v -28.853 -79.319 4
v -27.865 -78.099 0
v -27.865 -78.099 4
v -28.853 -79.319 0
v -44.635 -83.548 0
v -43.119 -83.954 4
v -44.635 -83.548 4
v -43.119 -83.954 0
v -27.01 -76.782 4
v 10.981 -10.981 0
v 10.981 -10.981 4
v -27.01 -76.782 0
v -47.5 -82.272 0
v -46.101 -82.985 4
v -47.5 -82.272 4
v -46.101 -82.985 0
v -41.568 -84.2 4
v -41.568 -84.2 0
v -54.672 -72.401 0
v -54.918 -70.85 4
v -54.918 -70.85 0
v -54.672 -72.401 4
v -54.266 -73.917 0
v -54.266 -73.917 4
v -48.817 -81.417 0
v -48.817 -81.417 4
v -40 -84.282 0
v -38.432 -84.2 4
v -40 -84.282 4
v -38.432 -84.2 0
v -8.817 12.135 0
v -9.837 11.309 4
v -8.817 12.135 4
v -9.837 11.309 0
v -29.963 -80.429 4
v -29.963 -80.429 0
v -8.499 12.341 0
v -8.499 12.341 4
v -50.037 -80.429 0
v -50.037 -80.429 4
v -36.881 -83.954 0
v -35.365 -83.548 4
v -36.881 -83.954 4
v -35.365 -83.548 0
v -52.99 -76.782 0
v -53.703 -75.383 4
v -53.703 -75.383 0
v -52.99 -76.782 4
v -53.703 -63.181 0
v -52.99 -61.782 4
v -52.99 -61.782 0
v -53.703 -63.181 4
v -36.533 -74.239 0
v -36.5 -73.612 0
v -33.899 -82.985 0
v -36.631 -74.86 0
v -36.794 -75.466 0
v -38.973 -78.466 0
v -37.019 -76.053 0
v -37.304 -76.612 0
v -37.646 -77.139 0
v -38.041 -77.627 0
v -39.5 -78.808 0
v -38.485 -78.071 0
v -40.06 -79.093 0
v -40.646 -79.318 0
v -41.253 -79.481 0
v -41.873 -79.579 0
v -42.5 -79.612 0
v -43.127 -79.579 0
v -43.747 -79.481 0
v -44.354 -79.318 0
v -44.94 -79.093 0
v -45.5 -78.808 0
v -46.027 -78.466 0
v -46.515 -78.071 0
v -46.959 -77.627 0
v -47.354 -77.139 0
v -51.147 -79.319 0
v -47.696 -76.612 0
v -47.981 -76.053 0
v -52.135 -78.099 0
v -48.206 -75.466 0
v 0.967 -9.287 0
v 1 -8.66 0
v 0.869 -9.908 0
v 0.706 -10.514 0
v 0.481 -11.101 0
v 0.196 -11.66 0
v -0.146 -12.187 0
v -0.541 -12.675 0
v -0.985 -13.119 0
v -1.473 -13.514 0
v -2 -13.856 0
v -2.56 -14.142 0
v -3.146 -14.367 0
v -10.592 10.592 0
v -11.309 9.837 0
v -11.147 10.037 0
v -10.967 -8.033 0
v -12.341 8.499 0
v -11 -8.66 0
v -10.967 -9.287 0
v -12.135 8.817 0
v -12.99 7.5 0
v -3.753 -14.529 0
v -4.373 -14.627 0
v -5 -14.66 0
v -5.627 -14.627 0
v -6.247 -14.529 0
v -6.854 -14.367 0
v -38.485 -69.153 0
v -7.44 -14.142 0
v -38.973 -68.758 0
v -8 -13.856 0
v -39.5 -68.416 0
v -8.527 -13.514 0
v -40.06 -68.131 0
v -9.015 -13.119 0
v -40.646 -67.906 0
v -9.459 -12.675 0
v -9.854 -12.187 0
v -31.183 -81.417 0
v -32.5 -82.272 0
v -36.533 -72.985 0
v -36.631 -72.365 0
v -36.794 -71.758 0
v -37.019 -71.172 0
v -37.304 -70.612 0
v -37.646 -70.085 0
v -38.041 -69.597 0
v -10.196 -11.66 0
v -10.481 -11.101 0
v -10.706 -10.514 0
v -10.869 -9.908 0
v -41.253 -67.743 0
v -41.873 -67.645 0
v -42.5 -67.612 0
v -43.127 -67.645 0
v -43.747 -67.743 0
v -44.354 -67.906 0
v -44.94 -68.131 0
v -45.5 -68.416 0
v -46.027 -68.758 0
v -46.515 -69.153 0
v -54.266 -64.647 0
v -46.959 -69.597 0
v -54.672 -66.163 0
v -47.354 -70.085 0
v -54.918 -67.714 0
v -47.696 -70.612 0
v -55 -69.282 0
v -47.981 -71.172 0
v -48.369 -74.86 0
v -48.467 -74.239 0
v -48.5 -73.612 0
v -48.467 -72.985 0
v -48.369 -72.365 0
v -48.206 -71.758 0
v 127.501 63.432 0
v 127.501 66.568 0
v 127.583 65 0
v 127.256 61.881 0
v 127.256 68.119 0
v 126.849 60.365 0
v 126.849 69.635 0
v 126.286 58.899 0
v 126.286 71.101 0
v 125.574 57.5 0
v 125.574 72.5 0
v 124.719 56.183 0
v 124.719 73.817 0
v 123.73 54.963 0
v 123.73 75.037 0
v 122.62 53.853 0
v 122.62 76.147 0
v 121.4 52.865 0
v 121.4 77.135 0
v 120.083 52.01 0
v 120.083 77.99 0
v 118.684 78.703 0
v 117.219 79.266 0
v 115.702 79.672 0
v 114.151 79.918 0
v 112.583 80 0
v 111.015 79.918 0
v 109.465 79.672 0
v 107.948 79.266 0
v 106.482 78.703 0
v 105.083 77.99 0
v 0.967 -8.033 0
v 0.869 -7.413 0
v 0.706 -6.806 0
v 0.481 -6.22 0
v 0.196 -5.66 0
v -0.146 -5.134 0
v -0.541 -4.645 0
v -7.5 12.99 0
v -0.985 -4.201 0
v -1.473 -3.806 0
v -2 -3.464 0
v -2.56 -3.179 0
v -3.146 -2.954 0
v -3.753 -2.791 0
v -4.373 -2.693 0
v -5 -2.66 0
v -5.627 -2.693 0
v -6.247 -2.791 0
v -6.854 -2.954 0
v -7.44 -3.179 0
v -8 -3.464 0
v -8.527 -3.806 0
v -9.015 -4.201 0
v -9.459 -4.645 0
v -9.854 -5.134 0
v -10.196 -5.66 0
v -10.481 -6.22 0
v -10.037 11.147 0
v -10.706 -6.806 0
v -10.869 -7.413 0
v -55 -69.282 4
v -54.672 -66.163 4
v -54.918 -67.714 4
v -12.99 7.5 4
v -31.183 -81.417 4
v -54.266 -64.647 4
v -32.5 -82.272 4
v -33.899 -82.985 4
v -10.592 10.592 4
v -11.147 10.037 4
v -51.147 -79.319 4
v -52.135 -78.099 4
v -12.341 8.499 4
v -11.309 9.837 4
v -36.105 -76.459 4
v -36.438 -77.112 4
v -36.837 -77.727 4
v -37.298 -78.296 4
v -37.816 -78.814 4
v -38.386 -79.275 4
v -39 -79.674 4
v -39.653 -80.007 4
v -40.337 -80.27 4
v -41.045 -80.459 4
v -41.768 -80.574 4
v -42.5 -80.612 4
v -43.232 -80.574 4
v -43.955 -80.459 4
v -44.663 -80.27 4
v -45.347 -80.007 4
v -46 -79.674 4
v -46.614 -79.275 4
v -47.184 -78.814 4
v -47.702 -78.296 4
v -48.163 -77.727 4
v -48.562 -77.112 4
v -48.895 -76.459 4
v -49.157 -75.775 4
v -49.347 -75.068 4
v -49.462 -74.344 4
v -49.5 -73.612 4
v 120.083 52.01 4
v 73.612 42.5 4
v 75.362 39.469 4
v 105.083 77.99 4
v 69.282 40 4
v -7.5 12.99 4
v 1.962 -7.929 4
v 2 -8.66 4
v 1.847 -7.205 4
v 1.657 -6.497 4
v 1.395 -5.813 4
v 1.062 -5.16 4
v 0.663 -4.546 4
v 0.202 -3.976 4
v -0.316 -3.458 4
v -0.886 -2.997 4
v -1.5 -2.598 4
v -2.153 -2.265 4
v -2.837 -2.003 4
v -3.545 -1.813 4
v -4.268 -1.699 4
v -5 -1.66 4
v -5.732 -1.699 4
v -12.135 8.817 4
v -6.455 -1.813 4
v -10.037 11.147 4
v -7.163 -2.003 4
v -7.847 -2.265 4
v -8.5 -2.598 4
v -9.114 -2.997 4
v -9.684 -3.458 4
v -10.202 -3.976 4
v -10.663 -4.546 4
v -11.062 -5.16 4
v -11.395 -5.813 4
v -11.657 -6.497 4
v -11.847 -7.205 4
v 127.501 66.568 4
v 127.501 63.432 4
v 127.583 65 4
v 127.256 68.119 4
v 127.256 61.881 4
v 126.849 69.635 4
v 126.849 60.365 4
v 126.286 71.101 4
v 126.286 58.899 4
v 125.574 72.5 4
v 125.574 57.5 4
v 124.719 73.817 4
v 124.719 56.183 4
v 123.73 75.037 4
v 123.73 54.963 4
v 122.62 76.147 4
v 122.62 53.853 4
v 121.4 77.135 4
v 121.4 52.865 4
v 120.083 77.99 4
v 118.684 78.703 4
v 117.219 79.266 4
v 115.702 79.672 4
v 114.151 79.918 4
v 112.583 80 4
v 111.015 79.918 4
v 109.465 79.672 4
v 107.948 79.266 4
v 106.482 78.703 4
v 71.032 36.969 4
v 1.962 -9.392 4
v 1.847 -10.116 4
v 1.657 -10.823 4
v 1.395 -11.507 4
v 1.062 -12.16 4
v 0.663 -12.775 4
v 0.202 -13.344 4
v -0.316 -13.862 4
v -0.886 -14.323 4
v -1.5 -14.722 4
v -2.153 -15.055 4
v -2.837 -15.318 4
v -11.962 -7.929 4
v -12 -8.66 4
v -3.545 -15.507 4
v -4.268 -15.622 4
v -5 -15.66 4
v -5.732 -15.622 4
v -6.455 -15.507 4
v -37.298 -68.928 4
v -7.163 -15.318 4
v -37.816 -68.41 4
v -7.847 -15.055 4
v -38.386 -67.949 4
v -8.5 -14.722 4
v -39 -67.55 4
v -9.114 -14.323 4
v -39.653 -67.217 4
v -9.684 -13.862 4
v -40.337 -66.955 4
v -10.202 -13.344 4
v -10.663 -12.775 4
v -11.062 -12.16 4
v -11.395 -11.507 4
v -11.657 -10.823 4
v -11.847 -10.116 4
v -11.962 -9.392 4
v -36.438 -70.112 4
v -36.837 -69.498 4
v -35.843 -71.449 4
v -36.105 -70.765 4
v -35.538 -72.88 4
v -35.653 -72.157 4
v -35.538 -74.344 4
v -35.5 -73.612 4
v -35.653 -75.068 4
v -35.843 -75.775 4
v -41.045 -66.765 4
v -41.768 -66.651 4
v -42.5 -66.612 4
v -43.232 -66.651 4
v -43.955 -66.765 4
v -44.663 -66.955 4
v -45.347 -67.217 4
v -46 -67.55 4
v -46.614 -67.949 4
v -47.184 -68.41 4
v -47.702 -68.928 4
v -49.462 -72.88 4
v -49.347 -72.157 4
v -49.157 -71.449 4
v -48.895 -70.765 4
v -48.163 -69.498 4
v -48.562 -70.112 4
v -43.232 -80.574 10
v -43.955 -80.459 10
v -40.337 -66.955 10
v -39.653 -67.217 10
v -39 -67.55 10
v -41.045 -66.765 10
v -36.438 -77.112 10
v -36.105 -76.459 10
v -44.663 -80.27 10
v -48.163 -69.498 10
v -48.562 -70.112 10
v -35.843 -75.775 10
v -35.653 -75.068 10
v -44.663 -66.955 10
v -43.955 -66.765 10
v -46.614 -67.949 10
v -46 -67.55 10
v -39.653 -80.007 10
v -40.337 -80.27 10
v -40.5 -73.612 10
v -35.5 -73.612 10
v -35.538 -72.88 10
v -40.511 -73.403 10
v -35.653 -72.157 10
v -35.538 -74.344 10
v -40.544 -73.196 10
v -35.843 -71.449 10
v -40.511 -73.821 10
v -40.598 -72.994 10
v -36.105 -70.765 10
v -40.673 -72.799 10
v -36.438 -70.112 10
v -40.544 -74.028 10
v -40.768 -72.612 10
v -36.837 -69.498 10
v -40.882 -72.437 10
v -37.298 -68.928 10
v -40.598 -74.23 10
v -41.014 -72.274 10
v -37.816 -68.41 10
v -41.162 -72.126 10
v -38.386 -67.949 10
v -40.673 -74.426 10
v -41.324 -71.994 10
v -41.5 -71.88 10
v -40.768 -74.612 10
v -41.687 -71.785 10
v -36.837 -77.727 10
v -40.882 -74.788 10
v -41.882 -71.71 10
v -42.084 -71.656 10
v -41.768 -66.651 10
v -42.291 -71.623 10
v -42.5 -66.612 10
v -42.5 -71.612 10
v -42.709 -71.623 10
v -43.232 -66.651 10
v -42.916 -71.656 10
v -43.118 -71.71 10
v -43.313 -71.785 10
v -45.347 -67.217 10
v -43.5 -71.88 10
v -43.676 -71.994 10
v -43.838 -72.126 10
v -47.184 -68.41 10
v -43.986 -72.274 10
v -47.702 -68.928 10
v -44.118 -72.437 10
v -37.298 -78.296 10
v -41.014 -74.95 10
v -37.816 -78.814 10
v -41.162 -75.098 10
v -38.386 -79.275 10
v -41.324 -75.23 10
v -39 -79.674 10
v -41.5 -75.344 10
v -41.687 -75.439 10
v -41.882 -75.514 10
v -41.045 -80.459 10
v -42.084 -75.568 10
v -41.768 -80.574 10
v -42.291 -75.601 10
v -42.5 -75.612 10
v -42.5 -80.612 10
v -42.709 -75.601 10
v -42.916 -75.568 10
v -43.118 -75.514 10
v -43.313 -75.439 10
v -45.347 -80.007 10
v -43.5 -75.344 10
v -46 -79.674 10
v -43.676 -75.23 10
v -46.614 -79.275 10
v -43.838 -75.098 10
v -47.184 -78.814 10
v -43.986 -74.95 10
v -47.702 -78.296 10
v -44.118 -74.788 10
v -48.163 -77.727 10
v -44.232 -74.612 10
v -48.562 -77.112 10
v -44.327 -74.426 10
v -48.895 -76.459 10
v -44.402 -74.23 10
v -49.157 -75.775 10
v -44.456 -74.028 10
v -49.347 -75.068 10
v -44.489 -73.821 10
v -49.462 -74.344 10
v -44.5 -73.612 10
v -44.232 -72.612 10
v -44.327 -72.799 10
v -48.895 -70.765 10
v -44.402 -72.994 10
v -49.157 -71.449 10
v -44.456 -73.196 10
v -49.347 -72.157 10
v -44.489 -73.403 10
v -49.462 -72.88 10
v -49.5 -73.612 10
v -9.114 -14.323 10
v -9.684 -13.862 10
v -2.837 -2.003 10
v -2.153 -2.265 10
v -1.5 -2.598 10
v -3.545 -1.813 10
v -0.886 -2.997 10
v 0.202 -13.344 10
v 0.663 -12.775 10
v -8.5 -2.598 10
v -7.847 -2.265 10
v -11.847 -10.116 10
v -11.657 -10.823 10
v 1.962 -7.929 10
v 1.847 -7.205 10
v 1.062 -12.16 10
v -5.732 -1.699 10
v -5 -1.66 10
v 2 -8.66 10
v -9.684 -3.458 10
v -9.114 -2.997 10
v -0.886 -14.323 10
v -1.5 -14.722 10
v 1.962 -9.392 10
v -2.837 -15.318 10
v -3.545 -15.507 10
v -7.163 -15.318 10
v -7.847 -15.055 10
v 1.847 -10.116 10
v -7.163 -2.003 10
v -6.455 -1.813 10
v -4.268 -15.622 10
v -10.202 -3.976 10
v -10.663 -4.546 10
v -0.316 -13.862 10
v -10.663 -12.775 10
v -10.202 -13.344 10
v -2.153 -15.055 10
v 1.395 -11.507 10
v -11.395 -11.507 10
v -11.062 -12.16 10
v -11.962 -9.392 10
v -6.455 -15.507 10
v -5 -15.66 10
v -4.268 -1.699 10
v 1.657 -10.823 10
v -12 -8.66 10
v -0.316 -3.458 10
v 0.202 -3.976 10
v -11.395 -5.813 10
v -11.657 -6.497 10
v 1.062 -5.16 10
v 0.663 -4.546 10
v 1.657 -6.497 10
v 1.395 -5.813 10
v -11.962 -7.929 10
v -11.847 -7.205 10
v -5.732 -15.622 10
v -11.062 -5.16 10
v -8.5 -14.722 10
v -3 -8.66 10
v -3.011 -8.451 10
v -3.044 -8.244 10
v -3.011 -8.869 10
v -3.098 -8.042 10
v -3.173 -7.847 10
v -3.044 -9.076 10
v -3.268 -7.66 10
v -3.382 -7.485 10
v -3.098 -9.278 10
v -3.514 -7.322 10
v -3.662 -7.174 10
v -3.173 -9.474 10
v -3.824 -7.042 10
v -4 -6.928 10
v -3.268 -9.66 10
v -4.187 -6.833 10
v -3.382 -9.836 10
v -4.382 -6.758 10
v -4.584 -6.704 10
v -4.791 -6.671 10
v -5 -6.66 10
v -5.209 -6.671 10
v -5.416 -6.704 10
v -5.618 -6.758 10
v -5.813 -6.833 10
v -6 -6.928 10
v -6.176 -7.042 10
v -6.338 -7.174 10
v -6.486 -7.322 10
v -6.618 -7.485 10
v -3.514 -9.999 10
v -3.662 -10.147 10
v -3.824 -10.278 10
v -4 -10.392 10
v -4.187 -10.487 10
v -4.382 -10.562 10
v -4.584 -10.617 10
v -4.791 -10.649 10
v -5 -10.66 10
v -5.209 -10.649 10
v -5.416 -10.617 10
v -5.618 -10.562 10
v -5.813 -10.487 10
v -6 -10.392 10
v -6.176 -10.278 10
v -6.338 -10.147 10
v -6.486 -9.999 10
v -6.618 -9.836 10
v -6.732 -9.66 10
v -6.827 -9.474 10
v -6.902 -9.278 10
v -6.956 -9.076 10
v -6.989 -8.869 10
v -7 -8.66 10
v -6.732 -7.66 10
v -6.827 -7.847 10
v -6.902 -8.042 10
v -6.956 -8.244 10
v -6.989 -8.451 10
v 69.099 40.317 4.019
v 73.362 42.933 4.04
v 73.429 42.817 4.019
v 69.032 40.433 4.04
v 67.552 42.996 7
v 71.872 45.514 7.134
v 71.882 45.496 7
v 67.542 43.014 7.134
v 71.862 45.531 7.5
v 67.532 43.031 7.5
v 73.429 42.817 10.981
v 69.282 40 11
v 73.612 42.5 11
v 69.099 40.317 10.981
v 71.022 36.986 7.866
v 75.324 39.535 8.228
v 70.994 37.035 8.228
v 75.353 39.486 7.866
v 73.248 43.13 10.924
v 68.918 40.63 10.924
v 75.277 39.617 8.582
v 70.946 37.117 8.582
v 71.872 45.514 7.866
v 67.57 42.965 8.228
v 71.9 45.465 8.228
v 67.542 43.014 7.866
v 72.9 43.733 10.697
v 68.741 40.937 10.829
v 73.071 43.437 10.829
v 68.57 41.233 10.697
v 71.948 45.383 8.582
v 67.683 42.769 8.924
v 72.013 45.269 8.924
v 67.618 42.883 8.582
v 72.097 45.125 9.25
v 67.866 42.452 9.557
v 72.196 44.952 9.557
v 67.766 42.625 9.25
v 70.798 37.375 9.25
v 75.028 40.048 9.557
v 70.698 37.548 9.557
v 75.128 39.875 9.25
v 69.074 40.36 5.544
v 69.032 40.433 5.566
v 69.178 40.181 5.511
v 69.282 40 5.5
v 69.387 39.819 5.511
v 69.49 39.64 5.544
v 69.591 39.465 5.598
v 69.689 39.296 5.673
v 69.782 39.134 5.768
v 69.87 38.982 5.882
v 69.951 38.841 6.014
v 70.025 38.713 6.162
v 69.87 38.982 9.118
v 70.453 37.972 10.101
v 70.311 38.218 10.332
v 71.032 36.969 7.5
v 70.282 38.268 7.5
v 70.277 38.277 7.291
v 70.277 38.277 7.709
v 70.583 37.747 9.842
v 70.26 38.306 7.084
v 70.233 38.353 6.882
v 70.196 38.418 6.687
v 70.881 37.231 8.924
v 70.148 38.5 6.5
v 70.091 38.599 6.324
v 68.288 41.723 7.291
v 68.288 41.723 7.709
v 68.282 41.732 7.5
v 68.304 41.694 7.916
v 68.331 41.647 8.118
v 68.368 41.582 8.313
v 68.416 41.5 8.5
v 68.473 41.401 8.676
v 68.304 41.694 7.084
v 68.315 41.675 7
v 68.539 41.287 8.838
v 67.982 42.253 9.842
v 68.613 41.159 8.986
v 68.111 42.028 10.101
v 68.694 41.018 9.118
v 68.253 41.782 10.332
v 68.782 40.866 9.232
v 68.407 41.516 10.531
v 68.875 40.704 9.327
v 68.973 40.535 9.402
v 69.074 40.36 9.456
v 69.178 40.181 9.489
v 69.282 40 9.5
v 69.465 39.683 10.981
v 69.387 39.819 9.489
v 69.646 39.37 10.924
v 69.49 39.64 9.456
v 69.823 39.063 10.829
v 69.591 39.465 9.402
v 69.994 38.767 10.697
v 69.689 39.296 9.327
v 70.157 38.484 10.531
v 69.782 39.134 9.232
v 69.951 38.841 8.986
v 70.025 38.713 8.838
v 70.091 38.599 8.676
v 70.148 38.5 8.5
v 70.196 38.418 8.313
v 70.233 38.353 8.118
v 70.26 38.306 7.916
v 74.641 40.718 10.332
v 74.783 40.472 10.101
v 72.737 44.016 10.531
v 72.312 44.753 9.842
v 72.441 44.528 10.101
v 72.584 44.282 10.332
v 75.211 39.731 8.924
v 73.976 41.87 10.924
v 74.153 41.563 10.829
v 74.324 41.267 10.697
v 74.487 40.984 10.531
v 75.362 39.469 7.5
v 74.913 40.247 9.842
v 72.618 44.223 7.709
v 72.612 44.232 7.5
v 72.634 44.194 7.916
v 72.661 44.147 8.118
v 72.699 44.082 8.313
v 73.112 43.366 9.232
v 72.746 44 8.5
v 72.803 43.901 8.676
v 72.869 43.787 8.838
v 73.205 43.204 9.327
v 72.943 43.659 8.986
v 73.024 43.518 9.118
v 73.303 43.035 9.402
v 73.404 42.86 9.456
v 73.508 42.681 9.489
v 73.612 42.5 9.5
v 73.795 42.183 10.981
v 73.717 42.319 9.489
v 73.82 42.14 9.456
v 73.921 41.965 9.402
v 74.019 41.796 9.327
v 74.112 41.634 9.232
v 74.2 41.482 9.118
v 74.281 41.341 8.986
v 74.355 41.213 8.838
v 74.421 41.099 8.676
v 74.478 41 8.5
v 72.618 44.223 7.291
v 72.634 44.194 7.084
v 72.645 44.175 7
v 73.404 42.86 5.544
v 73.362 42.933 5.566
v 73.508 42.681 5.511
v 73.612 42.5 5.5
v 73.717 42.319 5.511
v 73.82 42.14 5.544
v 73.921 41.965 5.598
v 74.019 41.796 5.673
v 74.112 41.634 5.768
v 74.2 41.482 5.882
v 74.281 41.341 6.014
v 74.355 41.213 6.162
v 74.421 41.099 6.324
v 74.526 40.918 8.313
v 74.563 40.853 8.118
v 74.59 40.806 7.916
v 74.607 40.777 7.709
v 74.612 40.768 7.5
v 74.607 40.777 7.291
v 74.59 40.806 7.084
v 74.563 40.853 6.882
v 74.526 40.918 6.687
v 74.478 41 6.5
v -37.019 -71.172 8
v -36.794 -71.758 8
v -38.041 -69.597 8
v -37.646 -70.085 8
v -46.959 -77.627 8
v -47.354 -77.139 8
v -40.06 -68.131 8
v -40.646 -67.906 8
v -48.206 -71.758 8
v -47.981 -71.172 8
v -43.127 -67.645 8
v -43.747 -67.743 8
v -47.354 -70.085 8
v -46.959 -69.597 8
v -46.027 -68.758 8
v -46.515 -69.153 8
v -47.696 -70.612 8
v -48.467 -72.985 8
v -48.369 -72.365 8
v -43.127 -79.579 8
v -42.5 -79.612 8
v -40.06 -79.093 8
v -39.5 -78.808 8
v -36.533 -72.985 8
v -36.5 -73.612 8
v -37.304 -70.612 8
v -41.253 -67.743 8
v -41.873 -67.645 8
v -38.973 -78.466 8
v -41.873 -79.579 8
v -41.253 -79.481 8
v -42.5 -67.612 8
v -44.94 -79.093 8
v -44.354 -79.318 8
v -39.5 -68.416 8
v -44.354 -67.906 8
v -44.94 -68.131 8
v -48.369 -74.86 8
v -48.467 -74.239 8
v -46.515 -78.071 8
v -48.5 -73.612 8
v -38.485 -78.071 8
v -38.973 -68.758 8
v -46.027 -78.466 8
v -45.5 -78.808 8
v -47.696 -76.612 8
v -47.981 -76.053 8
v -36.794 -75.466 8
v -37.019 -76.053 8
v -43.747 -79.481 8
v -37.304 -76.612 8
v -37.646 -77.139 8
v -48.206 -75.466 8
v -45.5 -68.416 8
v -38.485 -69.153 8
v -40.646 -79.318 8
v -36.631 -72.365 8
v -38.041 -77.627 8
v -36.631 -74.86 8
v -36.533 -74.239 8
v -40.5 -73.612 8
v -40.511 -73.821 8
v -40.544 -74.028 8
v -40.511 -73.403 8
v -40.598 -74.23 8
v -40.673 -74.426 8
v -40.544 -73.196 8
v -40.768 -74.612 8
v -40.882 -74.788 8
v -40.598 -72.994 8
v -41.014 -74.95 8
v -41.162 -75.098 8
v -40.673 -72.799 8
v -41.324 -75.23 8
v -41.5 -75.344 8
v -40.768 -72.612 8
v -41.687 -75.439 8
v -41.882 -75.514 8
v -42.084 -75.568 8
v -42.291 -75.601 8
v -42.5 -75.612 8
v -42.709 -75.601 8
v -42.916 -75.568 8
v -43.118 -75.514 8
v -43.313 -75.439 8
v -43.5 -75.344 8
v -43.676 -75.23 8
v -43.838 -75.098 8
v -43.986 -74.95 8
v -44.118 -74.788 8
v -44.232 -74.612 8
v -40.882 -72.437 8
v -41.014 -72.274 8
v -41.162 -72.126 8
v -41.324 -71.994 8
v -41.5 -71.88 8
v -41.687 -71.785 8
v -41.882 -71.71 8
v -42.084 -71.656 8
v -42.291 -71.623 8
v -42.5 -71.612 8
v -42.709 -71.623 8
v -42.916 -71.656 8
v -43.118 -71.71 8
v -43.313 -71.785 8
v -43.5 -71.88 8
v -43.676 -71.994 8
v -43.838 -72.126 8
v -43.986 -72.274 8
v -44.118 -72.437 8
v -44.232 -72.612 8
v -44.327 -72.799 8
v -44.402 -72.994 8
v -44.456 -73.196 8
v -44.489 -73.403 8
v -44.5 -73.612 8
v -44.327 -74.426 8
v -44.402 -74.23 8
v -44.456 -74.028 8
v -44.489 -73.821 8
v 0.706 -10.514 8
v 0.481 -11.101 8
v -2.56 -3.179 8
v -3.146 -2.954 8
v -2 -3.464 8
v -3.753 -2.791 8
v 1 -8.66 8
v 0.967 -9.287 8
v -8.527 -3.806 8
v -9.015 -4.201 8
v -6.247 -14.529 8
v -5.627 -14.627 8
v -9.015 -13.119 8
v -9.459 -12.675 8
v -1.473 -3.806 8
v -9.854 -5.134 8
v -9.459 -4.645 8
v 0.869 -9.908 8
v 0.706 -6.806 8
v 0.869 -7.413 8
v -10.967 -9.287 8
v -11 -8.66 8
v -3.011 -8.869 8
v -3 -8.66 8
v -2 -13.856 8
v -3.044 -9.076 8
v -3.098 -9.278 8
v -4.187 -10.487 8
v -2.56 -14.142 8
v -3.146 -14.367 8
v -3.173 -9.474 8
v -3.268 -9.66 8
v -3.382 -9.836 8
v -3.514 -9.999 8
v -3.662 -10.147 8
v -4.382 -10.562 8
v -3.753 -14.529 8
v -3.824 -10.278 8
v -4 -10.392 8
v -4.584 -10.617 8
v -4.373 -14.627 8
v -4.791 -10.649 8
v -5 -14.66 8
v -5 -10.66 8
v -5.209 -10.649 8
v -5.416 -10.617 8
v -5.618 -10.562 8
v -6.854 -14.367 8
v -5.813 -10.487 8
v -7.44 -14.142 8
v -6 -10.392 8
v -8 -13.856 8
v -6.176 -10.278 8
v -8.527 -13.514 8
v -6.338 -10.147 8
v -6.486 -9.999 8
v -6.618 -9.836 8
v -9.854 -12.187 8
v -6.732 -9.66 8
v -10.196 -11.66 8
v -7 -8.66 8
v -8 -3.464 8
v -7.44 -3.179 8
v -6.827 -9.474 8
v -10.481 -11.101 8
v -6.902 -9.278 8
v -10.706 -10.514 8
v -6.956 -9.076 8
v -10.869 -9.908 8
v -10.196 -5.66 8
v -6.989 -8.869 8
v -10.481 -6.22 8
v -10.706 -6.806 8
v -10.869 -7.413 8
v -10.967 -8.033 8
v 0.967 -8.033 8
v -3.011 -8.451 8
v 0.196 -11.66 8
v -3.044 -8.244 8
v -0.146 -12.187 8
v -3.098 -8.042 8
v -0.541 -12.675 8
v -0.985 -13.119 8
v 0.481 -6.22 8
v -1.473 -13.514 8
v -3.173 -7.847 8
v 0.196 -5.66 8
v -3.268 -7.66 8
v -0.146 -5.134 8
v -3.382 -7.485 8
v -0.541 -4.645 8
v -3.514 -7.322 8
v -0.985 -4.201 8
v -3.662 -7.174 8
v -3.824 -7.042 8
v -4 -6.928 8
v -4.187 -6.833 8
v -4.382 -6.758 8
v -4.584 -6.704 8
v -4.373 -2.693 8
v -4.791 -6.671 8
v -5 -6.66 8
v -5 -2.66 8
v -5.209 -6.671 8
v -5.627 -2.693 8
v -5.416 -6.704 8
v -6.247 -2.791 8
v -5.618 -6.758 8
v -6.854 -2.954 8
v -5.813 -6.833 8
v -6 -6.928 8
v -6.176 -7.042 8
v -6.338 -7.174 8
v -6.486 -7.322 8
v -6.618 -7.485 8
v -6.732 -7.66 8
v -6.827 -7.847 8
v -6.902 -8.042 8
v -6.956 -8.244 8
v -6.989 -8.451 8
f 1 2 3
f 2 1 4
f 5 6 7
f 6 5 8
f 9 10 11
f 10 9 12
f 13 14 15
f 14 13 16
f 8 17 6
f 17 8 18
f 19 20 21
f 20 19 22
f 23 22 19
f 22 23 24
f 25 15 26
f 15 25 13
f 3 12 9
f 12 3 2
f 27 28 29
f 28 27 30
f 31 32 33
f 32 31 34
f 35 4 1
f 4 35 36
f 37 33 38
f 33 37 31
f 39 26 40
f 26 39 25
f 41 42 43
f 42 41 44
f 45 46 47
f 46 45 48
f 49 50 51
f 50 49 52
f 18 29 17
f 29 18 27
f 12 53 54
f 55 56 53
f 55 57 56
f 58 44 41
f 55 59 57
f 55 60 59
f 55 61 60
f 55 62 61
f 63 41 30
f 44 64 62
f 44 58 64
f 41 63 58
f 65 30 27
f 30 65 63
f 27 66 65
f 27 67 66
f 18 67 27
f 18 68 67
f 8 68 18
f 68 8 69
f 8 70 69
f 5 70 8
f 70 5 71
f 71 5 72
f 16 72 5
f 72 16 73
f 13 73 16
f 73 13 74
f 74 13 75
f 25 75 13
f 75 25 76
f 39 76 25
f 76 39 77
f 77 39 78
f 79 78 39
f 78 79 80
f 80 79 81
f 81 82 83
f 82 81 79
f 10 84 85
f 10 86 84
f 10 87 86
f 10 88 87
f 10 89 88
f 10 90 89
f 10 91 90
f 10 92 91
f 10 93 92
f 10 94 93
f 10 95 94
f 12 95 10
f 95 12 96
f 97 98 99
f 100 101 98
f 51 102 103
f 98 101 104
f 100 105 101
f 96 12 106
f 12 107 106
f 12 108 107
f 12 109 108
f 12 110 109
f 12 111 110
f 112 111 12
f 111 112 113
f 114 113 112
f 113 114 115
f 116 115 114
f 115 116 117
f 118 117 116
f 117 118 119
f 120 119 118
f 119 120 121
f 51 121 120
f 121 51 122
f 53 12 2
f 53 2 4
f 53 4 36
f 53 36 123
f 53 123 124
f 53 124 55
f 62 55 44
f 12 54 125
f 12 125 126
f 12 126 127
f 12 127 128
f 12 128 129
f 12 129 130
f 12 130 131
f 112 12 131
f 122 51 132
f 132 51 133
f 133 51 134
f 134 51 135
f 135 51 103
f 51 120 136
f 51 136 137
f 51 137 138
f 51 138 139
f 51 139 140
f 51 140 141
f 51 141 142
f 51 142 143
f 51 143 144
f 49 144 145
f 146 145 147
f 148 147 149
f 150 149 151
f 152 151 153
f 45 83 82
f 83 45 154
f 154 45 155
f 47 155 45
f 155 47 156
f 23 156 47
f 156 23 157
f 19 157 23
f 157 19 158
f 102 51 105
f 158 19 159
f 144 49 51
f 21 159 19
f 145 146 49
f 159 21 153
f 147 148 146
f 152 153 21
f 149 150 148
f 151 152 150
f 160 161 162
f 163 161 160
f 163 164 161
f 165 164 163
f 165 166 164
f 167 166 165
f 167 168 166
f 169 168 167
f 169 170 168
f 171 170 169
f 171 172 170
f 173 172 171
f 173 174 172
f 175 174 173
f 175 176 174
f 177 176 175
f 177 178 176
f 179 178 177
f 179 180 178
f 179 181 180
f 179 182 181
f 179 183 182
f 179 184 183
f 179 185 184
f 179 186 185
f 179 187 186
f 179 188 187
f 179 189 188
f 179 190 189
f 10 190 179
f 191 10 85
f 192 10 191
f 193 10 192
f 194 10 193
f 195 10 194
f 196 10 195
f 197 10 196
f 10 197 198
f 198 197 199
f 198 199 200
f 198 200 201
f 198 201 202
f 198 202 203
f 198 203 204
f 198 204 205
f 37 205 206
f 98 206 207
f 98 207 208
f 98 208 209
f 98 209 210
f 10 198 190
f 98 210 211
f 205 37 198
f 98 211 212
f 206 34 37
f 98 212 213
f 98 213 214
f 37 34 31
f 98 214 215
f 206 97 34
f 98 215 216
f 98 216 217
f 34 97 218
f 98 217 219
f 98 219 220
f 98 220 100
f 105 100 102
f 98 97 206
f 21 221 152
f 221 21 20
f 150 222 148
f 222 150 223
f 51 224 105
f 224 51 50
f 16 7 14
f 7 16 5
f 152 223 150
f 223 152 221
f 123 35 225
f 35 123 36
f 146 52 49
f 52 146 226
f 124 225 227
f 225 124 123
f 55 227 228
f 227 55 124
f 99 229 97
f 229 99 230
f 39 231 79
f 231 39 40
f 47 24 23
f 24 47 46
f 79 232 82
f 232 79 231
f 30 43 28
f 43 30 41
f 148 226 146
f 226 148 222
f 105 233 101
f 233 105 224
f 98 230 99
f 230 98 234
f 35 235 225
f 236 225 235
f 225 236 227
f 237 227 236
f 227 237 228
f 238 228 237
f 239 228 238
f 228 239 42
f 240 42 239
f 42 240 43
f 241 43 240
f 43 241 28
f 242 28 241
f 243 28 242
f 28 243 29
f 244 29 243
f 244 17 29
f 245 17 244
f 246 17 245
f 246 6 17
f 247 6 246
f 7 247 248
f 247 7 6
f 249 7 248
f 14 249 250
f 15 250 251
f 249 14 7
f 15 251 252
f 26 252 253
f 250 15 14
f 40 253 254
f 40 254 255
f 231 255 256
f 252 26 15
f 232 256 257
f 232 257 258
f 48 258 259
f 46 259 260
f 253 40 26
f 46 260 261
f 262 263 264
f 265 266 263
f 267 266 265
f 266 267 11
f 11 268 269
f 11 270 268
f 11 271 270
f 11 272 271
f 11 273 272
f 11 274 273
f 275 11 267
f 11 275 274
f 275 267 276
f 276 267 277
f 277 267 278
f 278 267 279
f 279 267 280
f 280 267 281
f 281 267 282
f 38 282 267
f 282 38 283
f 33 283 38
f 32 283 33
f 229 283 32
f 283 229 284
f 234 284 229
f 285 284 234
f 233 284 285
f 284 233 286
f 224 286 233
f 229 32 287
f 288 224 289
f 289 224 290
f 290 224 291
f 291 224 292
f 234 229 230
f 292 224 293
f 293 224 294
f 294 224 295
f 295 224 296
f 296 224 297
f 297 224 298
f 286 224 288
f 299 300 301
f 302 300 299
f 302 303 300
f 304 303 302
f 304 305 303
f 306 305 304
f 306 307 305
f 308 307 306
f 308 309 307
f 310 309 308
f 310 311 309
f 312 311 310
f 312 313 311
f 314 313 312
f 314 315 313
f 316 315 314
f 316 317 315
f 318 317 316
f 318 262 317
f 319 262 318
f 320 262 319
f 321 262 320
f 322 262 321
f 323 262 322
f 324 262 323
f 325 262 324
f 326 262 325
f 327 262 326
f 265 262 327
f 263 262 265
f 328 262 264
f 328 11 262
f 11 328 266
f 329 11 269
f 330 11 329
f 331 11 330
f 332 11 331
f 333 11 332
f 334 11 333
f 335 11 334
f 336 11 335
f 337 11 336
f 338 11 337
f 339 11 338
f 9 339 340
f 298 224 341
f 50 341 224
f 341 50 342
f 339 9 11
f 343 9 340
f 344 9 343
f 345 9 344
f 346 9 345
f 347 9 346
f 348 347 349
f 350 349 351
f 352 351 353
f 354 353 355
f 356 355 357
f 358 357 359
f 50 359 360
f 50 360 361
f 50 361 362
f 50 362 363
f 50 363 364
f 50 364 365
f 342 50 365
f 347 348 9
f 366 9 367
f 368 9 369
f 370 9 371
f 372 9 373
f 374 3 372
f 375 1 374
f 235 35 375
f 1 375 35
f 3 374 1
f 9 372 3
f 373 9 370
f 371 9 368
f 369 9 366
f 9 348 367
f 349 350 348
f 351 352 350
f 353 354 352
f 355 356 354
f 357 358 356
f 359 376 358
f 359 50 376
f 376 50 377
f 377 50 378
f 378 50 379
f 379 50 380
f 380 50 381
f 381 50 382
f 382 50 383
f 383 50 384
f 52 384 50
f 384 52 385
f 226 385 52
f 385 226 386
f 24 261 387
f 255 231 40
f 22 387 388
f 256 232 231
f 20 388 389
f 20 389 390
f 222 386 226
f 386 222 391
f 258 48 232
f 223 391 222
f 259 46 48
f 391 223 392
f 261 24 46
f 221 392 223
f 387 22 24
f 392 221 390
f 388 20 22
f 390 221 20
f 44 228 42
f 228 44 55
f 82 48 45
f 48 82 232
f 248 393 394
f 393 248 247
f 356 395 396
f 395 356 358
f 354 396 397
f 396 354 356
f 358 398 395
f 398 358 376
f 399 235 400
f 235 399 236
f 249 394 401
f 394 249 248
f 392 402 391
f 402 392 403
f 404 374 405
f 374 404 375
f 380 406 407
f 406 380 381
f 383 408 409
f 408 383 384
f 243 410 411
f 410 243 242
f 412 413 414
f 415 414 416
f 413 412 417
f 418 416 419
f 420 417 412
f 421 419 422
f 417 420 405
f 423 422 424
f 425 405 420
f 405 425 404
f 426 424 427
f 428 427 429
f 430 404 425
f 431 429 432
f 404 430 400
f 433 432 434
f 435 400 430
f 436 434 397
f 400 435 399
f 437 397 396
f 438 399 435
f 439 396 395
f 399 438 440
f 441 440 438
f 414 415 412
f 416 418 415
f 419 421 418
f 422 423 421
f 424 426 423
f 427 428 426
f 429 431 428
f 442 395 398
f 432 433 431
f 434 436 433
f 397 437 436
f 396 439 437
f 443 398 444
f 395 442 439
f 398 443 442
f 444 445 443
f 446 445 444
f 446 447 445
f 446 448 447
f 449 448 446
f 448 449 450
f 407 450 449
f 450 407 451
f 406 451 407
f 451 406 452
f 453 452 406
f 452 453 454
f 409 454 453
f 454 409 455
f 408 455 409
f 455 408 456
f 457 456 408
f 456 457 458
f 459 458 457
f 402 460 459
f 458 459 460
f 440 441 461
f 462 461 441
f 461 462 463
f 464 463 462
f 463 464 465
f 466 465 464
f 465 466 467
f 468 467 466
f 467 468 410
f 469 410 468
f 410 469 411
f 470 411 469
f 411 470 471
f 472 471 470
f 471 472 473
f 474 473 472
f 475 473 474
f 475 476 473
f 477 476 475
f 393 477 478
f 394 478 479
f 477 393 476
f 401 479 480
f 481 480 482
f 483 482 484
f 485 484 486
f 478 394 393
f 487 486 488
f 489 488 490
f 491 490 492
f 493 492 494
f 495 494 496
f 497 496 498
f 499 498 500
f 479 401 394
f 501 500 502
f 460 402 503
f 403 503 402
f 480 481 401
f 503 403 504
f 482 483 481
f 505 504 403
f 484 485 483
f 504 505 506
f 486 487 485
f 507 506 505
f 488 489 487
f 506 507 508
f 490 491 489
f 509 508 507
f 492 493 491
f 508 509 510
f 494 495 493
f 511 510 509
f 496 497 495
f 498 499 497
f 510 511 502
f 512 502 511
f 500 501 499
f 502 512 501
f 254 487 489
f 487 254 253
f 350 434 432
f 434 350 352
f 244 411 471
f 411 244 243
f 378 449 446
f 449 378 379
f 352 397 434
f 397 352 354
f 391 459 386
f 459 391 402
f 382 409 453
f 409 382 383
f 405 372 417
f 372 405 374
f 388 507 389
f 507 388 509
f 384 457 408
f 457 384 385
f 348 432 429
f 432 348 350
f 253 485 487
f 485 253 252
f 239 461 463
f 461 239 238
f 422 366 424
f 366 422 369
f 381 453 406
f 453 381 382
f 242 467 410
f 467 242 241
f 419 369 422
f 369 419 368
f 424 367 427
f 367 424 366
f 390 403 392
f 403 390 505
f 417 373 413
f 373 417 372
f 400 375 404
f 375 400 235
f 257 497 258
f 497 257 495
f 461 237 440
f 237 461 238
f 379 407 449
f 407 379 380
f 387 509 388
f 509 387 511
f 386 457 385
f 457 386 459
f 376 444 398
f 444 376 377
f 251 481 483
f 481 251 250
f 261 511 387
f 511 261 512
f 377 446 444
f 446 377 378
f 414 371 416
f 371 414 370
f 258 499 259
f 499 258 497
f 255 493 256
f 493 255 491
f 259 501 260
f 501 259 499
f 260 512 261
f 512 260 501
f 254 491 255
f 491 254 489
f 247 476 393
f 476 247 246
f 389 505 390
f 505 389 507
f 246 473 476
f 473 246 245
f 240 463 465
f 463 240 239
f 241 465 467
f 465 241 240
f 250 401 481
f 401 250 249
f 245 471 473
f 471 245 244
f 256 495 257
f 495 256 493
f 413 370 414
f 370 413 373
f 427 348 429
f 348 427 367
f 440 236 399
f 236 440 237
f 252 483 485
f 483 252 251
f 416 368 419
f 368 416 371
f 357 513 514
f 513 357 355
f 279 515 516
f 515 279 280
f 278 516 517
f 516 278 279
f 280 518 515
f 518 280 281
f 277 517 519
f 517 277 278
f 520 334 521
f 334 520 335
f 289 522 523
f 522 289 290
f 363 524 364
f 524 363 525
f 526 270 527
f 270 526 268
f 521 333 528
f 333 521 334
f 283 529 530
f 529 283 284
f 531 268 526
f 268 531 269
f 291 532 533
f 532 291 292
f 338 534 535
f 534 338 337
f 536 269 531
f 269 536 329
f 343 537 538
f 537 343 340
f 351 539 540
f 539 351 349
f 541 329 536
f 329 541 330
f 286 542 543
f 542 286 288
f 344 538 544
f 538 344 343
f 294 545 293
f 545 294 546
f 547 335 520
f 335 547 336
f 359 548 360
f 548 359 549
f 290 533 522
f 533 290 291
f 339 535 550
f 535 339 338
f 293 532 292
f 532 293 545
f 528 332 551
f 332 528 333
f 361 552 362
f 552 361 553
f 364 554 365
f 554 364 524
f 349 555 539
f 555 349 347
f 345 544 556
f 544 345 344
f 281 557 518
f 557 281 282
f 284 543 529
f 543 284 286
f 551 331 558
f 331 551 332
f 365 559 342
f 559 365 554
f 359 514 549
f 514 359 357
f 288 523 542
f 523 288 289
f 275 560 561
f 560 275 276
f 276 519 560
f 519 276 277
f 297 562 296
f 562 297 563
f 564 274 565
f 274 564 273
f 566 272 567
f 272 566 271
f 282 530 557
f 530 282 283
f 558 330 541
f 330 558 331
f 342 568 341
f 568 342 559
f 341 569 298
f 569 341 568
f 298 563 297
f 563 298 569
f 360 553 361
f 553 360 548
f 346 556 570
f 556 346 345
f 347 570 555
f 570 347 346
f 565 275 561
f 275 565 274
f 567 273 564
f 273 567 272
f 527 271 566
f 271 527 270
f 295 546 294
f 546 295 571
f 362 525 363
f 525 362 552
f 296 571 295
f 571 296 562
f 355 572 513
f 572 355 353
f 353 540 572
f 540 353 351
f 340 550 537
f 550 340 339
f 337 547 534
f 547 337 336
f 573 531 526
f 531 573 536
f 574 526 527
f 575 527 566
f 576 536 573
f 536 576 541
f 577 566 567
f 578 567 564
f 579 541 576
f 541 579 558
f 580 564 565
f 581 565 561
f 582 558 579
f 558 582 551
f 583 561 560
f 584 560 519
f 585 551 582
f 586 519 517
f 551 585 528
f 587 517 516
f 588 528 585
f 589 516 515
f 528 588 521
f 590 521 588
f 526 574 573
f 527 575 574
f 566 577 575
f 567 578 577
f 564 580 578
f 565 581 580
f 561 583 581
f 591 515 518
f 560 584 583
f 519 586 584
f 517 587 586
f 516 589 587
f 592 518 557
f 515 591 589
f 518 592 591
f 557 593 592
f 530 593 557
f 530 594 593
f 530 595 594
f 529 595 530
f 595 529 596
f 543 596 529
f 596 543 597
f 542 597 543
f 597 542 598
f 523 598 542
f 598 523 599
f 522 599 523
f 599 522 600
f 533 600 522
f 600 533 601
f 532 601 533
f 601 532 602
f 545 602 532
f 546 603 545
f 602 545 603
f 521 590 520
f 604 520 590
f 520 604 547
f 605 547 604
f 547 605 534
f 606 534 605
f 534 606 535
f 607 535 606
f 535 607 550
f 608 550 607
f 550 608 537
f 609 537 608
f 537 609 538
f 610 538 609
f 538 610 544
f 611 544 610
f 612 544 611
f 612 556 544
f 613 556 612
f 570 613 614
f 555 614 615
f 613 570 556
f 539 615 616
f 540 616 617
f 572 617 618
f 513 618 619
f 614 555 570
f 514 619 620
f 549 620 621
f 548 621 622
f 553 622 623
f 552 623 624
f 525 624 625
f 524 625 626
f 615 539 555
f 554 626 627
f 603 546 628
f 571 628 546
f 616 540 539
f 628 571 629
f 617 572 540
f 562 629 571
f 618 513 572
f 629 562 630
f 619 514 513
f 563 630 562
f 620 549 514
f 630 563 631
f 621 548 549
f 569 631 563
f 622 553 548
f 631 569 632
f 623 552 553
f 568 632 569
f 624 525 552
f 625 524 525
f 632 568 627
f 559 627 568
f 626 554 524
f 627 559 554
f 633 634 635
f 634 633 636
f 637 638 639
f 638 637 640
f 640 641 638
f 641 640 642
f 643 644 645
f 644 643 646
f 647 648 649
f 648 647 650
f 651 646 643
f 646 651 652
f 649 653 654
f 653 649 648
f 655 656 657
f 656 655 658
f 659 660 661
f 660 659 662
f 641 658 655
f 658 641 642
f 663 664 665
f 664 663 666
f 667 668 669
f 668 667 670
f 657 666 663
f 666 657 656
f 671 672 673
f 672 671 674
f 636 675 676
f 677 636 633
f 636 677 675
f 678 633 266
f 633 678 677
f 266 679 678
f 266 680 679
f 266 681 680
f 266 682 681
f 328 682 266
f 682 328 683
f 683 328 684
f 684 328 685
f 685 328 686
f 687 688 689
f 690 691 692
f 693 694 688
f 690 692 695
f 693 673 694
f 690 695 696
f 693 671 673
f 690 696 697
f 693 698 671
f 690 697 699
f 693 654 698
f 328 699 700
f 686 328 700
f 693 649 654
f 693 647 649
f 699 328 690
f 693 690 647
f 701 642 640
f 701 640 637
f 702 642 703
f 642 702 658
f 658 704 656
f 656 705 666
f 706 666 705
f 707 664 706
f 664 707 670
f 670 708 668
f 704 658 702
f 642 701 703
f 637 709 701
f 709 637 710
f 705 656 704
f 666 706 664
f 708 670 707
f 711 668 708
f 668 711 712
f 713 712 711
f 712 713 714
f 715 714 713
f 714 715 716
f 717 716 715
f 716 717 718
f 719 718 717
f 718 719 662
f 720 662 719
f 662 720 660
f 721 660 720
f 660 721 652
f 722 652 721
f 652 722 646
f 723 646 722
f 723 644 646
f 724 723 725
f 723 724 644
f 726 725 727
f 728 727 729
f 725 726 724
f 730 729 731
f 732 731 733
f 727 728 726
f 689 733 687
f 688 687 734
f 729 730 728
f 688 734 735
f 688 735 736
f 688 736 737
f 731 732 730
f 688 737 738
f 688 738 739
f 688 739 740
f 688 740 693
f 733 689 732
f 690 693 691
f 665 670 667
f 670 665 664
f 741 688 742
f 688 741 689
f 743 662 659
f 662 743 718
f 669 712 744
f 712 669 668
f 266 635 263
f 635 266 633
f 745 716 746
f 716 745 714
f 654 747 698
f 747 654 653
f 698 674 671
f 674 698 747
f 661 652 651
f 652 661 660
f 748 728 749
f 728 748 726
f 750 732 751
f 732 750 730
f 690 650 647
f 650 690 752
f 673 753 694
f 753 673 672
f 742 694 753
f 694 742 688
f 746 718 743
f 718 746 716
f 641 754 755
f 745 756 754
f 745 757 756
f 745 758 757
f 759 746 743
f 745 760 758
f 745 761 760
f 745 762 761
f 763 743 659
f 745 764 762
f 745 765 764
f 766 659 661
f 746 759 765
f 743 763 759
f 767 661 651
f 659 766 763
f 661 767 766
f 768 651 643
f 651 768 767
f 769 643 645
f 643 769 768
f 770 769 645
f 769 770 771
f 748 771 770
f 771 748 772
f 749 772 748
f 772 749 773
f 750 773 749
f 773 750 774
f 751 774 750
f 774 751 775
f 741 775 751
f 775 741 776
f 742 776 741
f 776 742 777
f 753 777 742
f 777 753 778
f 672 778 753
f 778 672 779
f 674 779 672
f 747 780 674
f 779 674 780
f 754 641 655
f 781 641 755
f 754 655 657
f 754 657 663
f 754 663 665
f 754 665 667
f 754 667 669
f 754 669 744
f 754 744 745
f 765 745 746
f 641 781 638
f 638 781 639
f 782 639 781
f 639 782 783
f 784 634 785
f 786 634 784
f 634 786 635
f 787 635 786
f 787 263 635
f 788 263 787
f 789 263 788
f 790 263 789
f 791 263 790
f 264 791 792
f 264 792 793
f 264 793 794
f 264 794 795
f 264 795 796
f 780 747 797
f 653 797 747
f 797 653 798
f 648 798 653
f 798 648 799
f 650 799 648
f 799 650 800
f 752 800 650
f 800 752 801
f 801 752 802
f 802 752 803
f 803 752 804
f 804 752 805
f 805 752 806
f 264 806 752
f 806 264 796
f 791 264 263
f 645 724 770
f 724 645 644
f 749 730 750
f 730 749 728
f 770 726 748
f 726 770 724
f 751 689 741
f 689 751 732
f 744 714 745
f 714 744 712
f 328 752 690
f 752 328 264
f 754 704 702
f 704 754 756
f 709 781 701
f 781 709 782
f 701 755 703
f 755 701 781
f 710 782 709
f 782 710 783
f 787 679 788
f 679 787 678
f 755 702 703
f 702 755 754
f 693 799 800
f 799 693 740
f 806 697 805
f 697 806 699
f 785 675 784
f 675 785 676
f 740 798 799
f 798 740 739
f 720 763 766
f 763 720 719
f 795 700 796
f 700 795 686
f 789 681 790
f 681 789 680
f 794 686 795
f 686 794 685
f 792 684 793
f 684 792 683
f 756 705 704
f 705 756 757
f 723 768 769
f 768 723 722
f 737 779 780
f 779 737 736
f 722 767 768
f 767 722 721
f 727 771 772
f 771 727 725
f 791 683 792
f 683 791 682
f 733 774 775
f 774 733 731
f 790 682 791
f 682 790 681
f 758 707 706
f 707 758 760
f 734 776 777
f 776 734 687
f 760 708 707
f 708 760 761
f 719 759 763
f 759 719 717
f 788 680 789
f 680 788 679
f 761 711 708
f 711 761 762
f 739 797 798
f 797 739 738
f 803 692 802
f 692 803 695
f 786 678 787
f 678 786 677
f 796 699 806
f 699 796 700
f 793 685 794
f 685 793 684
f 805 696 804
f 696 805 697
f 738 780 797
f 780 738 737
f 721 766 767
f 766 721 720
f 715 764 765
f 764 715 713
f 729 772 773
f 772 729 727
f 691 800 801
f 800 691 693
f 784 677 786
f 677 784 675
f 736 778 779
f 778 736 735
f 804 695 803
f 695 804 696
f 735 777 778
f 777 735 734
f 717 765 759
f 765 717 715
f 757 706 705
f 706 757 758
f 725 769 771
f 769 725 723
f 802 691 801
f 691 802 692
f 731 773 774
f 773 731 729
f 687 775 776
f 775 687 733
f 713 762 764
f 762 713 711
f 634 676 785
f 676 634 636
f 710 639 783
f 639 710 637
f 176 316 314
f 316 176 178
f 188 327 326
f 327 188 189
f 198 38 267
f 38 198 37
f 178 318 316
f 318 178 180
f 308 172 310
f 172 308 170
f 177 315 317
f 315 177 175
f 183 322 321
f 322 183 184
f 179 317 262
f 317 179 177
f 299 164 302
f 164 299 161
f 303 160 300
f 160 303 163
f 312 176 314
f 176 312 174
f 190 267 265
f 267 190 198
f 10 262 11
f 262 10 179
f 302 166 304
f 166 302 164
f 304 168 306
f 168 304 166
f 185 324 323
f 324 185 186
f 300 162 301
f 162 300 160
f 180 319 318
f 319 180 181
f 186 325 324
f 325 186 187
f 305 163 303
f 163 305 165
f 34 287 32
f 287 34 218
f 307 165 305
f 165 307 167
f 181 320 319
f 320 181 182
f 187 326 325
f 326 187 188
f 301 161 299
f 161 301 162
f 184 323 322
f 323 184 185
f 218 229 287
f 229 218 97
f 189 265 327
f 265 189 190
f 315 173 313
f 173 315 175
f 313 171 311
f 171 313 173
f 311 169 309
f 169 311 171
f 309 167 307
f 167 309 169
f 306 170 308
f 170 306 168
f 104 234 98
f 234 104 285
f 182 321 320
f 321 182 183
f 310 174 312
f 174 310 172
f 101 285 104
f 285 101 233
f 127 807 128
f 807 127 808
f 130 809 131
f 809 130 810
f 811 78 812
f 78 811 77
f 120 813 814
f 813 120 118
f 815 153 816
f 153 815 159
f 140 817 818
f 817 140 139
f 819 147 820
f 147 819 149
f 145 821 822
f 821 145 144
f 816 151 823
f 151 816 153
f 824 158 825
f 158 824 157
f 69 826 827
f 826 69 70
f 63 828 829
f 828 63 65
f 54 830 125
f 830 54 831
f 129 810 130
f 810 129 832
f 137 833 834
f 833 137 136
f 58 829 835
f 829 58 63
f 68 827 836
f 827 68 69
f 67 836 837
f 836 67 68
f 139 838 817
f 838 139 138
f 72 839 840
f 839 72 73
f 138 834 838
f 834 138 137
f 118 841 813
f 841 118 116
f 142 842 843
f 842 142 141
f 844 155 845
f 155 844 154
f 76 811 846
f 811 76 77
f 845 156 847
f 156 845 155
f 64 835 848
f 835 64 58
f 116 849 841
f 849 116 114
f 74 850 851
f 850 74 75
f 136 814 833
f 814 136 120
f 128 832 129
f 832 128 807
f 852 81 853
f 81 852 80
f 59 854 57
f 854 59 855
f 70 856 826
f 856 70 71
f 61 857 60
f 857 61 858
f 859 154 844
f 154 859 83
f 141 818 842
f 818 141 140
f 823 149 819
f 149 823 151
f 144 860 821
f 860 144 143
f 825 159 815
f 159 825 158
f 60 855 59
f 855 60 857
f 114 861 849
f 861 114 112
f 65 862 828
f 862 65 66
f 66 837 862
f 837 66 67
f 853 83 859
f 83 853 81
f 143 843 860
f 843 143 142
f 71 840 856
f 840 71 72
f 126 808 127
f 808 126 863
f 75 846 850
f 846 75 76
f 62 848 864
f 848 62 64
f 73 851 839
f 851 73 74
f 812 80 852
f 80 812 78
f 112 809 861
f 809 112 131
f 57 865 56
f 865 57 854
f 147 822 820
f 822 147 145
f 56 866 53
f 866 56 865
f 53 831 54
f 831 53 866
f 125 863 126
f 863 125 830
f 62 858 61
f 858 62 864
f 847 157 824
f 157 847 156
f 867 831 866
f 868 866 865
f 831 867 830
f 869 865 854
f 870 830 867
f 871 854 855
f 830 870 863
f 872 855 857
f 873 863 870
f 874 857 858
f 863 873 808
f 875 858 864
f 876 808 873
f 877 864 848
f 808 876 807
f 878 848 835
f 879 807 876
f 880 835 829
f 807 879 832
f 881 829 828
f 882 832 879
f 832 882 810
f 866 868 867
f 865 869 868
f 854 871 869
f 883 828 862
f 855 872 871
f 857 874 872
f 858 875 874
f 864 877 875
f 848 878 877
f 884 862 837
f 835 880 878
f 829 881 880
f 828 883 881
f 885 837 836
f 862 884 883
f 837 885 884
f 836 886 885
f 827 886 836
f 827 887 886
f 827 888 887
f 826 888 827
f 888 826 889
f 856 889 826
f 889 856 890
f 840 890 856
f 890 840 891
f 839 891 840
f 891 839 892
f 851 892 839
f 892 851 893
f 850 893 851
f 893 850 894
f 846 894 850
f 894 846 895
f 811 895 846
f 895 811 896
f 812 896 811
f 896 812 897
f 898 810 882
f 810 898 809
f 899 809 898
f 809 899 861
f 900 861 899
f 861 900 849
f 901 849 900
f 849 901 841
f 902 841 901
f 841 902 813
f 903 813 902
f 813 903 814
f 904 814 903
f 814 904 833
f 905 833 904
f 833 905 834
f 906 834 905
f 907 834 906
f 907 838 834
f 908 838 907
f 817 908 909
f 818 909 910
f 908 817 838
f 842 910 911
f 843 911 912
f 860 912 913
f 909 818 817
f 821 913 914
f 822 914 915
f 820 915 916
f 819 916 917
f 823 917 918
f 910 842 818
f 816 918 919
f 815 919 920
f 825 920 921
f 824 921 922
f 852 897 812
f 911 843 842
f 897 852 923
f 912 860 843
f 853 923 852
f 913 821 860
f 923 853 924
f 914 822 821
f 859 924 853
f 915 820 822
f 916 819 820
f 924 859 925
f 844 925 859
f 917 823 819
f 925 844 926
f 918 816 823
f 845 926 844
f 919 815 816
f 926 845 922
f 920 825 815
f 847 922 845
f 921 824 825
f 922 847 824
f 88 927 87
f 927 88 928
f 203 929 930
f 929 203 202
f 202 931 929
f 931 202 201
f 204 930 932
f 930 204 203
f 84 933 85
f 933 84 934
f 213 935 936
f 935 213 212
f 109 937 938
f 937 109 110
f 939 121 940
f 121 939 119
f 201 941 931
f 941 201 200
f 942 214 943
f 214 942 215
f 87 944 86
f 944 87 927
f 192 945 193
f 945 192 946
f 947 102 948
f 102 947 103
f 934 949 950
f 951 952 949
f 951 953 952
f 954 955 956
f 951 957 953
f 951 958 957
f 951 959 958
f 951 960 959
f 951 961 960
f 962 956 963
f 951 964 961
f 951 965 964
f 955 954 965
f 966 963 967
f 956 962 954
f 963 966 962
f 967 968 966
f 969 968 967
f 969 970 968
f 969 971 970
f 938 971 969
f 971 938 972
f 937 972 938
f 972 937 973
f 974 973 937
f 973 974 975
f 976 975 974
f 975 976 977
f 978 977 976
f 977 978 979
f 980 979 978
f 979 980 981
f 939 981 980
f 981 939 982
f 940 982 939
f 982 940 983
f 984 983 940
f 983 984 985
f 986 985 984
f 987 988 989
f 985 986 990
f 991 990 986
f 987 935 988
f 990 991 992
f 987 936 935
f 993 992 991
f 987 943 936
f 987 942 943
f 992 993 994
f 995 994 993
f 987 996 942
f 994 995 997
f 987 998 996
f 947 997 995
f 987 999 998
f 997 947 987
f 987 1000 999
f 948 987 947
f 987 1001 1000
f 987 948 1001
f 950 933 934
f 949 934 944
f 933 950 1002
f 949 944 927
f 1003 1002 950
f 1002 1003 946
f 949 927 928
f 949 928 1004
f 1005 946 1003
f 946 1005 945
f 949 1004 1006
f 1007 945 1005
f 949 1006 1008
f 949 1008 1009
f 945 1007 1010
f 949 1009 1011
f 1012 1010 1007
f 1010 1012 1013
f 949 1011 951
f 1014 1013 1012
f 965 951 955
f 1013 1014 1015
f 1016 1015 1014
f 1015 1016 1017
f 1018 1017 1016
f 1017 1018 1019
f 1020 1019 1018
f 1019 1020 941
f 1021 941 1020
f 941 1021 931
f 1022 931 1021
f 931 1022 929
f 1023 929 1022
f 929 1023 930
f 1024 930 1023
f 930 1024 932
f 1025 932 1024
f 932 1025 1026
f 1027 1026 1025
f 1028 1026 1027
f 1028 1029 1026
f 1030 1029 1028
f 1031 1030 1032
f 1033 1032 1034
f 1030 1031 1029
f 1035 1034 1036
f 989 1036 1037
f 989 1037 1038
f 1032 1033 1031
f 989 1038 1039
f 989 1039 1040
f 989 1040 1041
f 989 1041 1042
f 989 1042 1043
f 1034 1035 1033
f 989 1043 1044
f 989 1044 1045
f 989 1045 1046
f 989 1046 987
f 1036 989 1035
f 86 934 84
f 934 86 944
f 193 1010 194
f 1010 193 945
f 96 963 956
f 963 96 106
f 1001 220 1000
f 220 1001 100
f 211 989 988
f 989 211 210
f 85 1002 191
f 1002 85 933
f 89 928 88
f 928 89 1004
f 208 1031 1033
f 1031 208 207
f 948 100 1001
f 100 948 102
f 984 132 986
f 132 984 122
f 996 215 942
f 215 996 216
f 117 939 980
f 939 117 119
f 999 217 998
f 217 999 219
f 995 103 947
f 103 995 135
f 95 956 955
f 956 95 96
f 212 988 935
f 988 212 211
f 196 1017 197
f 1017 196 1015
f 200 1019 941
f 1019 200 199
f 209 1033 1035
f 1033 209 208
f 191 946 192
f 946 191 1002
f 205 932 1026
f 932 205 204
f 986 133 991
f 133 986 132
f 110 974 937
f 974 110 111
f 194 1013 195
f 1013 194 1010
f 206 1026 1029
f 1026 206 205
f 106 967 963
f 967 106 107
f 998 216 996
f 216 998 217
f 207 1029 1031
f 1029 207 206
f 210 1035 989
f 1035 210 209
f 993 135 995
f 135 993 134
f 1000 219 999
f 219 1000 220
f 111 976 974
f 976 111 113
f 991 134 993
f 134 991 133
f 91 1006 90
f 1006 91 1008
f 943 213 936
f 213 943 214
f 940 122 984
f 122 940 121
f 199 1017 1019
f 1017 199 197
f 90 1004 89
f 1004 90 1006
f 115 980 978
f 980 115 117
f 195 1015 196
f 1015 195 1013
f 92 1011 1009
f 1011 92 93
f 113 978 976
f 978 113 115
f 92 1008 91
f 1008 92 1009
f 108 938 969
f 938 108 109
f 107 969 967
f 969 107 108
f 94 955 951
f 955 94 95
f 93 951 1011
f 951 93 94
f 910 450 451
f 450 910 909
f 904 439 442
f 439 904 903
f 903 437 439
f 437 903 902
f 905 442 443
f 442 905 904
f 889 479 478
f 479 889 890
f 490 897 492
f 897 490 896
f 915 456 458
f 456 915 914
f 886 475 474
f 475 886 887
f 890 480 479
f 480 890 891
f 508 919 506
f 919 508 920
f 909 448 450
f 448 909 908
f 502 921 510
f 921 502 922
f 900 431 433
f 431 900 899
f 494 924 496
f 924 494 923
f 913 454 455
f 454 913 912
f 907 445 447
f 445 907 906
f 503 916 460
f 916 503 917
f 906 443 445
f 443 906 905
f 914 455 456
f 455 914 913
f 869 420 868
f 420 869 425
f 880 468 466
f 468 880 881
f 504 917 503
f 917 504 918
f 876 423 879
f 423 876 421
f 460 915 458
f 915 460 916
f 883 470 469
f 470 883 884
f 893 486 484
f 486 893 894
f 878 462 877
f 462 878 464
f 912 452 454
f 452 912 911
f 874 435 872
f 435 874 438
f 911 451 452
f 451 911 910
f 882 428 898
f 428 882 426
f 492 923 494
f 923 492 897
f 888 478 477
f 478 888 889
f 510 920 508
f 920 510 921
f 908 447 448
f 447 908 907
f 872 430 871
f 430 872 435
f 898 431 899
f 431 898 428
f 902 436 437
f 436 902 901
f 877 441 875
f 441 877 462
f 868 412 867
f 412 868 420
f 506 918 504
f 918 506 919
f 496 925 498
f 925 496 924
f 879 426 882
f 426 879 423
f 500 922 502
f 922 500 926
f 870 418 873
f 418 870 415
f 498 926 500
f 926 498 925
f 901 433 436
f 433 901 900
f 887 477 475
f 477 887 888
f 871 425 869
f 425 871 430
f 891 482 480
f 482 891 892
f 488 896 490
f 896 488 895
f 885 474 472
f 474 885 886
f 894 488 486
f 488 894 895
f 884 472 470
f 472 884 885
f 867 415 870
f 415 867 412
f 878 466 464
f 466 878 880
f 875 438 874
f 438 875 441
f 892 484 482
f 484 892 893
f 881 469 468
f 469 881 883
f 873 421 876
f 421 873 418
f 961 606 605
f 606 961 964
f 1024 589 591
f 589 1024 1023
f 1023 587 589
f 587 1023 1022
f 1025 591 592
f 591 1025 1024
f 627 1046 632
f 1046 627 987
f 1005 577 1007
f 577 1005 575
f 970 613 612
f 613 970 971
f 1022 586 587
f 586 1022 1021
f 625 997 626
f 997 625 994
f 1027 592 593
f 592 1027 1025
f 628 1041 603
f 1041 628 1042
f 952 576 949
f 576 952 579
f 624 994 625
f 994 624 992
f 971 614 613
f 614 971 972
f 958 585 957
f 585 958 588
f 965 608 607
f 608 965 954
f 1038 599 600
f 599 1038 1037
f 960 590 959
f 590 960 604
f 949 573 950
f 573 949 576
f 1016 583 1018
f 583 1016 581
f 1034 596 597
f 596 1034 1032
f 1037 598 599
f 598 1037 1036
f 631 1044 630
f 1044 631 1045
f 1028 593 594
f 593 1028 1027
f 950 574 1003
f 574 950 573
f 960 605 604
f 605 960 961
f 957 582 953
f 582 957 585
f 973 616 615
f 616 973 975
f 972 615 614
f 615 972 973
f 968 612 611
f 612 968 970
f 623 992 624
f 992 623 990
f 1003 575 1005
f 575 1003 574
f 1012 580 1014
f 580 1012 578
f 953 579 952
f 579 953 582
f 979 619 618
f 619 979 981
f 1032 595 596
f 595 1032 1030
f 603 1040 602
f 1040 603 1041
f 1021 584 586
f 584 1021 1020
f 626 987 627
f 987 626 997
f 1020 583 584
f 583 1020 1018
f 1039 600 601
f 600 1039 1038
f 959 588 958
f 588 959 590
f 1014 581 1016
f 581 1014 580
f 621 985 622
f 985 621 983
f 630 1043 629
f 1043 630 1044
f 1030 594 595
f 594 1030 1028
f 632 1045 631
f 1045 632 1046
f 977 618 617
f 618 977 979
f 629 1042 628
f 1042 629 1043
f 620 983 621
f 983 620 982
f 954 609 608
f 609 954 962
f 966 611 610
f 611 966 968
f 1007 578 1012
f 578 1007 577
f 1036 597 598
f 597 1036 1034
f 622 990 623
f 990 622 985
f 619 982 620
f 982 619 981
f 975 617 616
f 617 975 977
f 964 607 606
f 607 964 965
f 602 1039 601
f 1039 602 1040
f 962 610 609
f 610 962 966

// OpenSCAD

/* [Support] */
// Length of the mount arm. Longer arms will produce more vibrations.
armLenght = 145; // [120:170]

// Mount direction
mountDir = 1; // [1:To the right, -1:To the left]
// Angle between arms. Best suit for me was 30º
armsAngle = 30; // [0:90]

// Include cable holder
cableHolder = 1; // [0:No, 1:Yes]

// Cable diameter
cableDiameter = 4; // [1:10]

// Separation between cable holder and mount support
holderSeparation = 60; //[10:150]

/* [Hidden] */
width=30;
height=4;
corner=10;
len1=armLenght;
len2=95;


rad1=6;
rad2=7;
rad3=2;
h1=6;
h2=2;

// Separation between drills
dist1=75;

// Distance to end from mount base
dist2=10;
dist3=holderSeparation;
$fn=60;

ang=armsAngle*mountDir;

cR=1.5;
cabRad=cableDiameter/2;
cabLen=5;



rotate(a=[0, 0, (mountDir == 1 ? 0 : 180) + mountDir*30]) carMount();

module carMount() {
difference() {
union() {
sideA();
//translate([len1-dist2, 0, height]) mount();
rotate(a=[0, 0, ang]) translate([-len2+width/2, 0, 0]) sideB();
    if (cableHolder==1) translate([len1-dist3, 0, height]) cableHolder();
}
rotate(a=[0, 0, ang]) translate([-len2+width/2, 0, 0]) drills();
}
}

module cableHolder() {
    translate([0, 0, cabRad+cR]) rotate(a=[90, -180, -mountDir*90])
    difference() {
        union() {
    cylinder(r=cabRad+cR, h=cabLen);
    translate([-cabRad-cR, 0, 0]) cube([cabRad+cR, cabRad+cR, cabLen]);
        }
    translate([0, 0, -1]){ cylinder(r=cabRad, h=cabLen+2);
    translate([0.5, 0.5, 0]) cube([cabRad+cR, cabRad+cR, cabLen+2]);}}
}

module sideA() {
hull() {
    cylinder(r=width/2, h=height);
    translate([len1-width/2, 0, 0]) cylinder(r=width/2, h=height);
}    
}

module sideB() {
    hull() {
    cylinder(r=width/2, h=height);
    translate([(len2-width/2), 0, 0]) cylinder(r=width/2, h=height);
    }
    translate([-(width/2-10), 0, height]) cylinder(r=rad2, h=h1);
    translate([-(width/2-10)+dist1, 0, height]) cylinder(r=rad2, h=h1);
}

module drills() {
    translate([-(width/2-10), 0, -1]) cylinder(r=rad1, h=height+h1-h2+1);
    translate([-(width/2-10)+dist1, 0, -1]) cylinder(r=rad1, h=height+h1-h2+1);
    translate([-(width/2-10), 0, 0]) cylinder(r=rad3, h=height+h1+1);
    translate([-(width/2-10)+dist1, 0, 0]) cylinder(r=rad3, h=height+h1+1);
}
